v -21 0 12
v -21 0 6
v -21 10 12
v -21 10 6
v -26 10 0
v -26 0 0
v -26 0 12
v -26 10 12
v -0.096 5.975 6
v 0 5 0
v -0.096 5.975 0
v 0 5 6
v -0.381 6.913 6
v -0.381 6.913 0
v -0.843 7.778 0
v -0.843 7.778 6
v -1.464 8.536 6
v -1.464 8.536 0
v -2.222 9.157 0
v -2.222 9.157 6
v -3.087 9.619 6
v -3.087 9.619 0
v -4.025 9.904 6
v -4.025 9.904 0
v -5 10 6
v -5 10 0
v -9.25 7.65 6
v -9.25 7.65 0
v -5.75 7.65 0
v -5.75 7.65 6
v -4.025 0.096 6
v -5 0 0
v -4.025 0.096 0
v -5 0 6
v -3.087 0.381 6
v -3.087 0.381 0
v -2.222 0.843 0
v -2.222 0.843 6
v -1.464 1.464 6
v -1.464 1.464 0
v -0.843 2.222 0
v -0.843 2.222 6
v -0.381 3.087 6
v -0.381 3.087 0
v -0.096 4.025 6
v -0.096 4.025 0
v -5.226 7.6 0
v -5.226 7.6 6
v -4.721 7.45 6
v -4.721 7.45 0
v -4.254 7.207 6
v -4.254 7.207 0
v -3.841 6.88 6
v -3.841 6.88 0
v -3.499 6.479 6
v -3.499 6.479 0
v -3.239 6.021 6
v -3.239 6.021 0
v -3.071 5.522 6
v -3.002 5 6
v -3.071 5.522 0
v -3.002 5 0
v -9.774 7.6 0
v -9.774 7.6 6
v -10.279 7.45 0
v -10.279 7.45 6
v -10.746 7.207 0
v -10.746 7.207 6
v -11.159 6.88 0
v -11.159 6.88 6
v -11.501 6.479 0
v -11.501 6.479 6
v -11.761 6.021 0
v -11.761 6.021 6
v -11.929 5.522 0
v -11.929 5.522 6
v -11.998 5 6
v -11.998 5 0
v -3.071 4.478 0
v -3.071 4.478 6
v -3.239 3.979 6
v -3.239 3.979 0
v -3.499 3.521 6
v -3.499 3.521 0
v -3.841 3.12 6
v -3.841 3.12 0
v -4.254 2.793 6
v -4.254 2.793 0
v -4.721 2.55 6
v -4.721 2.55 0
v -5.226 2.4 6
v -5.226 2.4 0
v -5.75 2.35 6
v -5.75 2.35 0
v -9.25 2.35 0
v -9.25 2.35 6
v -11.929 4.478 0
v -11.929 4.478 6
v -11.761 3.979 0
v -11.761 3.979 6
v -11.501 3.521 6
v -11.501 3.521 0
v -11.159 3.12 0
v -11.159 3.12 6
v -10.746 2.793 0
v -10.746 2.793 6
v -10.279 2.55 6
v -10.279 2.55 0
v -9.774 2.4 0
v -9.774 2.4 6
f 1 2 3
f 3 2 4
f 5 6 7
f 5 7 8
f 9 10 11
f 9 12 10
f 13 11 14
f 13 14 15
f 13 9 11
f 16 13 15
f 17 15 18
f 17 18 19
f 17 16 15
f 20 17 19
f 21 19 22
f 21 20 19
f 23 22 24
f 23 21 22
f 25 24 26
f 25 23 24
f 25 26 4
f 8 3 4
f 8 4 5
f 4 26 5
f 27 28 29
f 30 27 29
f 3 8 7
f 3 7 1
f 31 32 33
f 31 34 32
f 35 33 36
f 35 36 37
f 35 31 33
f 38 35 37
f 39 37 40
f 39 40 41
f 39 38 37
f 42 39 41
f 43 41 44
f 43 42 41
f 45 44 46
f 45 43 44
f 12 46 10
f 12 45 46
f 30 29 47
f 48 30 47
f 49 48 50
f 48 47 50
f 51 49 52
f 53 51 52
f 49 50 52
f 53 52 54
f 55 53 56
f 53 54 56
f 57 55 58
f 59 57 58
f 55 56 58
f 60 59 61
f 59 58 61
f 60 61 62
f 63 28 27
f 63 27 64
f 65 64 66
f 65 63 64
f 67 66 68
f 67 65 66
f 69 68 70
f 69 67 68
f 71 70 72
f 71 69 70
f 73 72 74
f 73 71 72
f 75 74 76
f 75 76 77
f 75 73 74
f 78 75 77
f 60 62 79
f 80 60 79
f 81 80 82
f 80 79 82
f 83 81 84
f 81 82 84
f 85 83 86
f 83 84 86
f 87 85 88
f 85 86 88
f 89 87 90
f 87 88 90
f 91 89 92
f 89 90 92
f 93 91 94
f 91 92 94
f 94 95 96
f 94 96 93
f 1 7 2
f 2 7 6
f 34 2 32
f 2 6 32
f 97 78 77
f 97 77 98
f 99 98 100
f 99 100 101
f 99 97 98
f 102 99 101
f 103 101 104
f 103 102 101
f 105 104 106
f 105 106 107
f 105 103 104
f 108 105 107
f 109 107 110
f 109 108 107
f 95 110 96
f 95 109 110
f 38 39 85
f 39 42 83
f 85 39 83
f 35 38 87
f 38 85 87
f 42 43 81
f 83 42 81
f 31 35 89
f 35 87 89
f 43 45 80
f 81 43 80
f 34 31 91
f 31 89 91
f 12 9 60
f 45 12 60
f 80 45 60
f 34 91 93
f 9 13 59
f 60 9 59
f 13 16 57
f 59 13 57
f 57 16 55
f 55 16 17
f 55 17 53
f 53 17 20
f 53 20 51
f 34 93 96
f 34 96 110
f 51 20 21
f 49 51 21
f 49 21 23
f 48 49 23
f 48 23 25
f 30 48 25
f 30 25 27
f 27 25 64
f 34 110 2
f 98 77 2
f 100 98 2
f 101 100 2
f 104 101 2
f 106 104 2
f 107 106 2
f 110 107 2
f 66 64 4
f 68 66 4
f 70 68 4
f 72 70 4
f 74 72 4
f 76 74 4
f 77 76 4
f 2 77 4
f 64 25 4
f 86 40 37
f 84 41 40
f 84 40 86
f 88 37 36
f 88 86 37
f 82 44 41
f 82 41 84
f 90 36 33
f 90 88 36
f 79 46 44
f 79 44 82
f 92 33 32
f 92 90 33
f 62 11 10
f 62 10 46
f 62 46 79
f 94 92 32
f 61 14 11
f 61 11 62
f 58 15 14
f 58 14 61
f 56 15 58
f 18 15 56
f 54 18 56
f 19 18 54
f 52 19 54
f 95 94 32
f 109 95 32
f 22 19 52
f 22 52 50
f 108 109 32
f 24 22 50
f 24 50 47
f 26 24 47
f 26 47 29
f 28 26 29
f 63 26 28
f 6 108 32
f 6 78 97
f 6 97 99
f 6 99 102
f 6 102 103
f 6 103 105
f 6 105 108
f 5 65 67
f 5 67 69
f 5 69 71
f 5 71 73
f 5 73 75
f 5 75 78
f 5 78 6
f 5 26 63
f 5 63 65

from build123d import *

# Parameters (mm, degrees)
F0_W        = 21
F0_H        = 10
F0_W_2      = 9
F0_H_2      = 5.3
F0_W_3      = 5
F1_DEPTH    = 6
F2_DEPTH    = 12
F3_T1_DEPTH = 6
F4_R        = 4.99999


# Not quite as in the source:
# - a fillet or chamfer that OpenCascade refuses, or shapes differently, is made with other operations: its cross-section is extruded or revolved along the edge and cut away or added
# - a fillet or chamfer is up to 0.001 mm smaller than in the source, because OpenCascade refuses the exact size


with BuildPart() as f1:
    # F0 (on Top) → F1 (new body)
    with BuildSketch(Plane.XY):
        with Locations((-10.5, 5)):
            Rectangle(F0_W, F0_H)
        with Locations((-7.5, 5)):
            Rectangle(F0_W_2, F0_H_2, mode=Mode.SUBTRACT)
        with Locations((-23.5, 5)):
            Rectangle(F0_W_3, F0_H)
    extrude(amount=F1_DEPTH)

    # F0 (on Top) → F2 (join)
    with BuildSketch(Plane.XY):
        with Locations((-23.5, 5)):
            Rectangle(F0_W_3, F0_H)
    extrude(amount=F2_DEPTH)

    # F3: fillet of radius 2.75 on 4 edges, made by hand

    # F3_s2 → F3_t1 (join)
    with BuildSketch(Plane.XY):
        with BuildLine():
            ThreePointArc((-9.25, 7.65), (-11.1945436483, 6.8445436483), (-12, 4.9))
            Line((-12, 4.9), (-12, 7.65))
            Line((-12, 7.65), (-9.25, 7.65))
        make_face()
        with BuildLine():
            ThreePointArc((-12, 5.1), (-11.1945436483, 3.1554563517), (-9.25, 2.35))
            Line((-9.25, 2.35), (-12, 2.35))
            Line((-12, 2.35), (-12, 5.1))
        make_face()
        with BuildLine():
            ThreePointArc((-5.75, 7.65), (-3.8054563517, 6.8445436483), (-3, 4.9))
            Line((-3, 4.9), (-3, 7.65))
            Line((-3, 7.65), (-5.75, 7.65))
        make_face()
        with BuildLine():
            ThreePointArc((-3, 5.1), (-3.8054563517, 3.1554563517), (-5.75, 2.35))
            Line((-5.75, 2.35), (-3, 2.35))
            Line((-3, 2.35), (-3, 5.1))
        make_face()
    extrude(amount=F3_T1_DEPTH)

    # F4 (radius 5 in the source; OpenCascade refuses exactly that, so slightly less here)
    f4_edges = [f1.edges().sort_by_distance(p)[0] for p in [
        (0, 0, 3),
        (0, 10, 3),
    ]]
    fillet(f4_edges, radius=F4_R)


solid = f1.part
